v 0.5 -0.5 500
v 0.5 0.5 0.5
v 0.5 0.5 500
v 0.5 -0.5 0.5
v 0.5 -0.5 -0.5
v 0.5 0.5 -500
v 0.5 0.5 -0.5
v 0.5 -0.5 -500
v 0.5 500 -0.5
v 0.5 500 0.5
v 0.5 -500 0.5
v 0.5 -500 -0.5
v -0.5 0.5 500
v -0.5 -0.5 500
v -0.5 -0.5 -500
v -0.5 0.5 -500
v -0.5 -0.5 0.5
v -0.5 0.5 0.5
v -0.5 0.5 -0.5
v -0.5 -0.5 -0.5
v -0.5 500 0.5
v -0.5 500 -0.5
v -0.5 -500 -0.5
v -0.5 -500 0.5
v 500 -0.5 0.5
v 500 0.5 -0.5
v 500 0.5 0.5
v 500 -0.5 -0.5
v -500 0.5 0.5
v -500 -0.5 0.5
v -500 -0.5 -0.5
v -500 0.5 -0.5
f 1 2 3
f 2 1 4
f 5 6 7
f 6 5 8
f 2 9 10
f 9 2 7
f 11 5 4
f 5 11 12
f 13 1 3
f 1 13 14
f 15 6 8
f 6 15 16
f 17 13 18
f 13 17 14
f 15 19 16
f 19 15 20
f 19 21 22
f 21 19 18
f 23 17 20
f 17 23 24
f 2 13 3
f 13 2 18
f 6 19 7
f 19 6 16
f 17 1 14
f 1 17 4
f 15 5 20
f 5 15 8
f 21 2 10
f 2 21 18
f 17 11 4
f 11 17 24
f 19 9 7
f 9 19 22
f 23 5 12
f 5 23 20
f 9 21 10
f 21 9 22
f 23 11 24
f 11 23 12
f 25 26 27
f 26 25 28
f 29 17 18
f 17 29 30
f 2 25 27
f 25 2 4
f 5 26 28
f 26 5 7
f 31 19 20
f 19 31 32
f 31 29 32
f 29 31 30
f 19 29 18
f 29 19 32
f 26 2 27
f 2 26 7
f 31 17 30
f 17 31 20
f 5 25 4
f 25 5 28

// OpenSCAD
//:Model
module com()
{
	cube([1,1,1000],center=true);
	cube([1,1000,1],center=true);
	cube([1000,1,1],center=true);
}

com();
